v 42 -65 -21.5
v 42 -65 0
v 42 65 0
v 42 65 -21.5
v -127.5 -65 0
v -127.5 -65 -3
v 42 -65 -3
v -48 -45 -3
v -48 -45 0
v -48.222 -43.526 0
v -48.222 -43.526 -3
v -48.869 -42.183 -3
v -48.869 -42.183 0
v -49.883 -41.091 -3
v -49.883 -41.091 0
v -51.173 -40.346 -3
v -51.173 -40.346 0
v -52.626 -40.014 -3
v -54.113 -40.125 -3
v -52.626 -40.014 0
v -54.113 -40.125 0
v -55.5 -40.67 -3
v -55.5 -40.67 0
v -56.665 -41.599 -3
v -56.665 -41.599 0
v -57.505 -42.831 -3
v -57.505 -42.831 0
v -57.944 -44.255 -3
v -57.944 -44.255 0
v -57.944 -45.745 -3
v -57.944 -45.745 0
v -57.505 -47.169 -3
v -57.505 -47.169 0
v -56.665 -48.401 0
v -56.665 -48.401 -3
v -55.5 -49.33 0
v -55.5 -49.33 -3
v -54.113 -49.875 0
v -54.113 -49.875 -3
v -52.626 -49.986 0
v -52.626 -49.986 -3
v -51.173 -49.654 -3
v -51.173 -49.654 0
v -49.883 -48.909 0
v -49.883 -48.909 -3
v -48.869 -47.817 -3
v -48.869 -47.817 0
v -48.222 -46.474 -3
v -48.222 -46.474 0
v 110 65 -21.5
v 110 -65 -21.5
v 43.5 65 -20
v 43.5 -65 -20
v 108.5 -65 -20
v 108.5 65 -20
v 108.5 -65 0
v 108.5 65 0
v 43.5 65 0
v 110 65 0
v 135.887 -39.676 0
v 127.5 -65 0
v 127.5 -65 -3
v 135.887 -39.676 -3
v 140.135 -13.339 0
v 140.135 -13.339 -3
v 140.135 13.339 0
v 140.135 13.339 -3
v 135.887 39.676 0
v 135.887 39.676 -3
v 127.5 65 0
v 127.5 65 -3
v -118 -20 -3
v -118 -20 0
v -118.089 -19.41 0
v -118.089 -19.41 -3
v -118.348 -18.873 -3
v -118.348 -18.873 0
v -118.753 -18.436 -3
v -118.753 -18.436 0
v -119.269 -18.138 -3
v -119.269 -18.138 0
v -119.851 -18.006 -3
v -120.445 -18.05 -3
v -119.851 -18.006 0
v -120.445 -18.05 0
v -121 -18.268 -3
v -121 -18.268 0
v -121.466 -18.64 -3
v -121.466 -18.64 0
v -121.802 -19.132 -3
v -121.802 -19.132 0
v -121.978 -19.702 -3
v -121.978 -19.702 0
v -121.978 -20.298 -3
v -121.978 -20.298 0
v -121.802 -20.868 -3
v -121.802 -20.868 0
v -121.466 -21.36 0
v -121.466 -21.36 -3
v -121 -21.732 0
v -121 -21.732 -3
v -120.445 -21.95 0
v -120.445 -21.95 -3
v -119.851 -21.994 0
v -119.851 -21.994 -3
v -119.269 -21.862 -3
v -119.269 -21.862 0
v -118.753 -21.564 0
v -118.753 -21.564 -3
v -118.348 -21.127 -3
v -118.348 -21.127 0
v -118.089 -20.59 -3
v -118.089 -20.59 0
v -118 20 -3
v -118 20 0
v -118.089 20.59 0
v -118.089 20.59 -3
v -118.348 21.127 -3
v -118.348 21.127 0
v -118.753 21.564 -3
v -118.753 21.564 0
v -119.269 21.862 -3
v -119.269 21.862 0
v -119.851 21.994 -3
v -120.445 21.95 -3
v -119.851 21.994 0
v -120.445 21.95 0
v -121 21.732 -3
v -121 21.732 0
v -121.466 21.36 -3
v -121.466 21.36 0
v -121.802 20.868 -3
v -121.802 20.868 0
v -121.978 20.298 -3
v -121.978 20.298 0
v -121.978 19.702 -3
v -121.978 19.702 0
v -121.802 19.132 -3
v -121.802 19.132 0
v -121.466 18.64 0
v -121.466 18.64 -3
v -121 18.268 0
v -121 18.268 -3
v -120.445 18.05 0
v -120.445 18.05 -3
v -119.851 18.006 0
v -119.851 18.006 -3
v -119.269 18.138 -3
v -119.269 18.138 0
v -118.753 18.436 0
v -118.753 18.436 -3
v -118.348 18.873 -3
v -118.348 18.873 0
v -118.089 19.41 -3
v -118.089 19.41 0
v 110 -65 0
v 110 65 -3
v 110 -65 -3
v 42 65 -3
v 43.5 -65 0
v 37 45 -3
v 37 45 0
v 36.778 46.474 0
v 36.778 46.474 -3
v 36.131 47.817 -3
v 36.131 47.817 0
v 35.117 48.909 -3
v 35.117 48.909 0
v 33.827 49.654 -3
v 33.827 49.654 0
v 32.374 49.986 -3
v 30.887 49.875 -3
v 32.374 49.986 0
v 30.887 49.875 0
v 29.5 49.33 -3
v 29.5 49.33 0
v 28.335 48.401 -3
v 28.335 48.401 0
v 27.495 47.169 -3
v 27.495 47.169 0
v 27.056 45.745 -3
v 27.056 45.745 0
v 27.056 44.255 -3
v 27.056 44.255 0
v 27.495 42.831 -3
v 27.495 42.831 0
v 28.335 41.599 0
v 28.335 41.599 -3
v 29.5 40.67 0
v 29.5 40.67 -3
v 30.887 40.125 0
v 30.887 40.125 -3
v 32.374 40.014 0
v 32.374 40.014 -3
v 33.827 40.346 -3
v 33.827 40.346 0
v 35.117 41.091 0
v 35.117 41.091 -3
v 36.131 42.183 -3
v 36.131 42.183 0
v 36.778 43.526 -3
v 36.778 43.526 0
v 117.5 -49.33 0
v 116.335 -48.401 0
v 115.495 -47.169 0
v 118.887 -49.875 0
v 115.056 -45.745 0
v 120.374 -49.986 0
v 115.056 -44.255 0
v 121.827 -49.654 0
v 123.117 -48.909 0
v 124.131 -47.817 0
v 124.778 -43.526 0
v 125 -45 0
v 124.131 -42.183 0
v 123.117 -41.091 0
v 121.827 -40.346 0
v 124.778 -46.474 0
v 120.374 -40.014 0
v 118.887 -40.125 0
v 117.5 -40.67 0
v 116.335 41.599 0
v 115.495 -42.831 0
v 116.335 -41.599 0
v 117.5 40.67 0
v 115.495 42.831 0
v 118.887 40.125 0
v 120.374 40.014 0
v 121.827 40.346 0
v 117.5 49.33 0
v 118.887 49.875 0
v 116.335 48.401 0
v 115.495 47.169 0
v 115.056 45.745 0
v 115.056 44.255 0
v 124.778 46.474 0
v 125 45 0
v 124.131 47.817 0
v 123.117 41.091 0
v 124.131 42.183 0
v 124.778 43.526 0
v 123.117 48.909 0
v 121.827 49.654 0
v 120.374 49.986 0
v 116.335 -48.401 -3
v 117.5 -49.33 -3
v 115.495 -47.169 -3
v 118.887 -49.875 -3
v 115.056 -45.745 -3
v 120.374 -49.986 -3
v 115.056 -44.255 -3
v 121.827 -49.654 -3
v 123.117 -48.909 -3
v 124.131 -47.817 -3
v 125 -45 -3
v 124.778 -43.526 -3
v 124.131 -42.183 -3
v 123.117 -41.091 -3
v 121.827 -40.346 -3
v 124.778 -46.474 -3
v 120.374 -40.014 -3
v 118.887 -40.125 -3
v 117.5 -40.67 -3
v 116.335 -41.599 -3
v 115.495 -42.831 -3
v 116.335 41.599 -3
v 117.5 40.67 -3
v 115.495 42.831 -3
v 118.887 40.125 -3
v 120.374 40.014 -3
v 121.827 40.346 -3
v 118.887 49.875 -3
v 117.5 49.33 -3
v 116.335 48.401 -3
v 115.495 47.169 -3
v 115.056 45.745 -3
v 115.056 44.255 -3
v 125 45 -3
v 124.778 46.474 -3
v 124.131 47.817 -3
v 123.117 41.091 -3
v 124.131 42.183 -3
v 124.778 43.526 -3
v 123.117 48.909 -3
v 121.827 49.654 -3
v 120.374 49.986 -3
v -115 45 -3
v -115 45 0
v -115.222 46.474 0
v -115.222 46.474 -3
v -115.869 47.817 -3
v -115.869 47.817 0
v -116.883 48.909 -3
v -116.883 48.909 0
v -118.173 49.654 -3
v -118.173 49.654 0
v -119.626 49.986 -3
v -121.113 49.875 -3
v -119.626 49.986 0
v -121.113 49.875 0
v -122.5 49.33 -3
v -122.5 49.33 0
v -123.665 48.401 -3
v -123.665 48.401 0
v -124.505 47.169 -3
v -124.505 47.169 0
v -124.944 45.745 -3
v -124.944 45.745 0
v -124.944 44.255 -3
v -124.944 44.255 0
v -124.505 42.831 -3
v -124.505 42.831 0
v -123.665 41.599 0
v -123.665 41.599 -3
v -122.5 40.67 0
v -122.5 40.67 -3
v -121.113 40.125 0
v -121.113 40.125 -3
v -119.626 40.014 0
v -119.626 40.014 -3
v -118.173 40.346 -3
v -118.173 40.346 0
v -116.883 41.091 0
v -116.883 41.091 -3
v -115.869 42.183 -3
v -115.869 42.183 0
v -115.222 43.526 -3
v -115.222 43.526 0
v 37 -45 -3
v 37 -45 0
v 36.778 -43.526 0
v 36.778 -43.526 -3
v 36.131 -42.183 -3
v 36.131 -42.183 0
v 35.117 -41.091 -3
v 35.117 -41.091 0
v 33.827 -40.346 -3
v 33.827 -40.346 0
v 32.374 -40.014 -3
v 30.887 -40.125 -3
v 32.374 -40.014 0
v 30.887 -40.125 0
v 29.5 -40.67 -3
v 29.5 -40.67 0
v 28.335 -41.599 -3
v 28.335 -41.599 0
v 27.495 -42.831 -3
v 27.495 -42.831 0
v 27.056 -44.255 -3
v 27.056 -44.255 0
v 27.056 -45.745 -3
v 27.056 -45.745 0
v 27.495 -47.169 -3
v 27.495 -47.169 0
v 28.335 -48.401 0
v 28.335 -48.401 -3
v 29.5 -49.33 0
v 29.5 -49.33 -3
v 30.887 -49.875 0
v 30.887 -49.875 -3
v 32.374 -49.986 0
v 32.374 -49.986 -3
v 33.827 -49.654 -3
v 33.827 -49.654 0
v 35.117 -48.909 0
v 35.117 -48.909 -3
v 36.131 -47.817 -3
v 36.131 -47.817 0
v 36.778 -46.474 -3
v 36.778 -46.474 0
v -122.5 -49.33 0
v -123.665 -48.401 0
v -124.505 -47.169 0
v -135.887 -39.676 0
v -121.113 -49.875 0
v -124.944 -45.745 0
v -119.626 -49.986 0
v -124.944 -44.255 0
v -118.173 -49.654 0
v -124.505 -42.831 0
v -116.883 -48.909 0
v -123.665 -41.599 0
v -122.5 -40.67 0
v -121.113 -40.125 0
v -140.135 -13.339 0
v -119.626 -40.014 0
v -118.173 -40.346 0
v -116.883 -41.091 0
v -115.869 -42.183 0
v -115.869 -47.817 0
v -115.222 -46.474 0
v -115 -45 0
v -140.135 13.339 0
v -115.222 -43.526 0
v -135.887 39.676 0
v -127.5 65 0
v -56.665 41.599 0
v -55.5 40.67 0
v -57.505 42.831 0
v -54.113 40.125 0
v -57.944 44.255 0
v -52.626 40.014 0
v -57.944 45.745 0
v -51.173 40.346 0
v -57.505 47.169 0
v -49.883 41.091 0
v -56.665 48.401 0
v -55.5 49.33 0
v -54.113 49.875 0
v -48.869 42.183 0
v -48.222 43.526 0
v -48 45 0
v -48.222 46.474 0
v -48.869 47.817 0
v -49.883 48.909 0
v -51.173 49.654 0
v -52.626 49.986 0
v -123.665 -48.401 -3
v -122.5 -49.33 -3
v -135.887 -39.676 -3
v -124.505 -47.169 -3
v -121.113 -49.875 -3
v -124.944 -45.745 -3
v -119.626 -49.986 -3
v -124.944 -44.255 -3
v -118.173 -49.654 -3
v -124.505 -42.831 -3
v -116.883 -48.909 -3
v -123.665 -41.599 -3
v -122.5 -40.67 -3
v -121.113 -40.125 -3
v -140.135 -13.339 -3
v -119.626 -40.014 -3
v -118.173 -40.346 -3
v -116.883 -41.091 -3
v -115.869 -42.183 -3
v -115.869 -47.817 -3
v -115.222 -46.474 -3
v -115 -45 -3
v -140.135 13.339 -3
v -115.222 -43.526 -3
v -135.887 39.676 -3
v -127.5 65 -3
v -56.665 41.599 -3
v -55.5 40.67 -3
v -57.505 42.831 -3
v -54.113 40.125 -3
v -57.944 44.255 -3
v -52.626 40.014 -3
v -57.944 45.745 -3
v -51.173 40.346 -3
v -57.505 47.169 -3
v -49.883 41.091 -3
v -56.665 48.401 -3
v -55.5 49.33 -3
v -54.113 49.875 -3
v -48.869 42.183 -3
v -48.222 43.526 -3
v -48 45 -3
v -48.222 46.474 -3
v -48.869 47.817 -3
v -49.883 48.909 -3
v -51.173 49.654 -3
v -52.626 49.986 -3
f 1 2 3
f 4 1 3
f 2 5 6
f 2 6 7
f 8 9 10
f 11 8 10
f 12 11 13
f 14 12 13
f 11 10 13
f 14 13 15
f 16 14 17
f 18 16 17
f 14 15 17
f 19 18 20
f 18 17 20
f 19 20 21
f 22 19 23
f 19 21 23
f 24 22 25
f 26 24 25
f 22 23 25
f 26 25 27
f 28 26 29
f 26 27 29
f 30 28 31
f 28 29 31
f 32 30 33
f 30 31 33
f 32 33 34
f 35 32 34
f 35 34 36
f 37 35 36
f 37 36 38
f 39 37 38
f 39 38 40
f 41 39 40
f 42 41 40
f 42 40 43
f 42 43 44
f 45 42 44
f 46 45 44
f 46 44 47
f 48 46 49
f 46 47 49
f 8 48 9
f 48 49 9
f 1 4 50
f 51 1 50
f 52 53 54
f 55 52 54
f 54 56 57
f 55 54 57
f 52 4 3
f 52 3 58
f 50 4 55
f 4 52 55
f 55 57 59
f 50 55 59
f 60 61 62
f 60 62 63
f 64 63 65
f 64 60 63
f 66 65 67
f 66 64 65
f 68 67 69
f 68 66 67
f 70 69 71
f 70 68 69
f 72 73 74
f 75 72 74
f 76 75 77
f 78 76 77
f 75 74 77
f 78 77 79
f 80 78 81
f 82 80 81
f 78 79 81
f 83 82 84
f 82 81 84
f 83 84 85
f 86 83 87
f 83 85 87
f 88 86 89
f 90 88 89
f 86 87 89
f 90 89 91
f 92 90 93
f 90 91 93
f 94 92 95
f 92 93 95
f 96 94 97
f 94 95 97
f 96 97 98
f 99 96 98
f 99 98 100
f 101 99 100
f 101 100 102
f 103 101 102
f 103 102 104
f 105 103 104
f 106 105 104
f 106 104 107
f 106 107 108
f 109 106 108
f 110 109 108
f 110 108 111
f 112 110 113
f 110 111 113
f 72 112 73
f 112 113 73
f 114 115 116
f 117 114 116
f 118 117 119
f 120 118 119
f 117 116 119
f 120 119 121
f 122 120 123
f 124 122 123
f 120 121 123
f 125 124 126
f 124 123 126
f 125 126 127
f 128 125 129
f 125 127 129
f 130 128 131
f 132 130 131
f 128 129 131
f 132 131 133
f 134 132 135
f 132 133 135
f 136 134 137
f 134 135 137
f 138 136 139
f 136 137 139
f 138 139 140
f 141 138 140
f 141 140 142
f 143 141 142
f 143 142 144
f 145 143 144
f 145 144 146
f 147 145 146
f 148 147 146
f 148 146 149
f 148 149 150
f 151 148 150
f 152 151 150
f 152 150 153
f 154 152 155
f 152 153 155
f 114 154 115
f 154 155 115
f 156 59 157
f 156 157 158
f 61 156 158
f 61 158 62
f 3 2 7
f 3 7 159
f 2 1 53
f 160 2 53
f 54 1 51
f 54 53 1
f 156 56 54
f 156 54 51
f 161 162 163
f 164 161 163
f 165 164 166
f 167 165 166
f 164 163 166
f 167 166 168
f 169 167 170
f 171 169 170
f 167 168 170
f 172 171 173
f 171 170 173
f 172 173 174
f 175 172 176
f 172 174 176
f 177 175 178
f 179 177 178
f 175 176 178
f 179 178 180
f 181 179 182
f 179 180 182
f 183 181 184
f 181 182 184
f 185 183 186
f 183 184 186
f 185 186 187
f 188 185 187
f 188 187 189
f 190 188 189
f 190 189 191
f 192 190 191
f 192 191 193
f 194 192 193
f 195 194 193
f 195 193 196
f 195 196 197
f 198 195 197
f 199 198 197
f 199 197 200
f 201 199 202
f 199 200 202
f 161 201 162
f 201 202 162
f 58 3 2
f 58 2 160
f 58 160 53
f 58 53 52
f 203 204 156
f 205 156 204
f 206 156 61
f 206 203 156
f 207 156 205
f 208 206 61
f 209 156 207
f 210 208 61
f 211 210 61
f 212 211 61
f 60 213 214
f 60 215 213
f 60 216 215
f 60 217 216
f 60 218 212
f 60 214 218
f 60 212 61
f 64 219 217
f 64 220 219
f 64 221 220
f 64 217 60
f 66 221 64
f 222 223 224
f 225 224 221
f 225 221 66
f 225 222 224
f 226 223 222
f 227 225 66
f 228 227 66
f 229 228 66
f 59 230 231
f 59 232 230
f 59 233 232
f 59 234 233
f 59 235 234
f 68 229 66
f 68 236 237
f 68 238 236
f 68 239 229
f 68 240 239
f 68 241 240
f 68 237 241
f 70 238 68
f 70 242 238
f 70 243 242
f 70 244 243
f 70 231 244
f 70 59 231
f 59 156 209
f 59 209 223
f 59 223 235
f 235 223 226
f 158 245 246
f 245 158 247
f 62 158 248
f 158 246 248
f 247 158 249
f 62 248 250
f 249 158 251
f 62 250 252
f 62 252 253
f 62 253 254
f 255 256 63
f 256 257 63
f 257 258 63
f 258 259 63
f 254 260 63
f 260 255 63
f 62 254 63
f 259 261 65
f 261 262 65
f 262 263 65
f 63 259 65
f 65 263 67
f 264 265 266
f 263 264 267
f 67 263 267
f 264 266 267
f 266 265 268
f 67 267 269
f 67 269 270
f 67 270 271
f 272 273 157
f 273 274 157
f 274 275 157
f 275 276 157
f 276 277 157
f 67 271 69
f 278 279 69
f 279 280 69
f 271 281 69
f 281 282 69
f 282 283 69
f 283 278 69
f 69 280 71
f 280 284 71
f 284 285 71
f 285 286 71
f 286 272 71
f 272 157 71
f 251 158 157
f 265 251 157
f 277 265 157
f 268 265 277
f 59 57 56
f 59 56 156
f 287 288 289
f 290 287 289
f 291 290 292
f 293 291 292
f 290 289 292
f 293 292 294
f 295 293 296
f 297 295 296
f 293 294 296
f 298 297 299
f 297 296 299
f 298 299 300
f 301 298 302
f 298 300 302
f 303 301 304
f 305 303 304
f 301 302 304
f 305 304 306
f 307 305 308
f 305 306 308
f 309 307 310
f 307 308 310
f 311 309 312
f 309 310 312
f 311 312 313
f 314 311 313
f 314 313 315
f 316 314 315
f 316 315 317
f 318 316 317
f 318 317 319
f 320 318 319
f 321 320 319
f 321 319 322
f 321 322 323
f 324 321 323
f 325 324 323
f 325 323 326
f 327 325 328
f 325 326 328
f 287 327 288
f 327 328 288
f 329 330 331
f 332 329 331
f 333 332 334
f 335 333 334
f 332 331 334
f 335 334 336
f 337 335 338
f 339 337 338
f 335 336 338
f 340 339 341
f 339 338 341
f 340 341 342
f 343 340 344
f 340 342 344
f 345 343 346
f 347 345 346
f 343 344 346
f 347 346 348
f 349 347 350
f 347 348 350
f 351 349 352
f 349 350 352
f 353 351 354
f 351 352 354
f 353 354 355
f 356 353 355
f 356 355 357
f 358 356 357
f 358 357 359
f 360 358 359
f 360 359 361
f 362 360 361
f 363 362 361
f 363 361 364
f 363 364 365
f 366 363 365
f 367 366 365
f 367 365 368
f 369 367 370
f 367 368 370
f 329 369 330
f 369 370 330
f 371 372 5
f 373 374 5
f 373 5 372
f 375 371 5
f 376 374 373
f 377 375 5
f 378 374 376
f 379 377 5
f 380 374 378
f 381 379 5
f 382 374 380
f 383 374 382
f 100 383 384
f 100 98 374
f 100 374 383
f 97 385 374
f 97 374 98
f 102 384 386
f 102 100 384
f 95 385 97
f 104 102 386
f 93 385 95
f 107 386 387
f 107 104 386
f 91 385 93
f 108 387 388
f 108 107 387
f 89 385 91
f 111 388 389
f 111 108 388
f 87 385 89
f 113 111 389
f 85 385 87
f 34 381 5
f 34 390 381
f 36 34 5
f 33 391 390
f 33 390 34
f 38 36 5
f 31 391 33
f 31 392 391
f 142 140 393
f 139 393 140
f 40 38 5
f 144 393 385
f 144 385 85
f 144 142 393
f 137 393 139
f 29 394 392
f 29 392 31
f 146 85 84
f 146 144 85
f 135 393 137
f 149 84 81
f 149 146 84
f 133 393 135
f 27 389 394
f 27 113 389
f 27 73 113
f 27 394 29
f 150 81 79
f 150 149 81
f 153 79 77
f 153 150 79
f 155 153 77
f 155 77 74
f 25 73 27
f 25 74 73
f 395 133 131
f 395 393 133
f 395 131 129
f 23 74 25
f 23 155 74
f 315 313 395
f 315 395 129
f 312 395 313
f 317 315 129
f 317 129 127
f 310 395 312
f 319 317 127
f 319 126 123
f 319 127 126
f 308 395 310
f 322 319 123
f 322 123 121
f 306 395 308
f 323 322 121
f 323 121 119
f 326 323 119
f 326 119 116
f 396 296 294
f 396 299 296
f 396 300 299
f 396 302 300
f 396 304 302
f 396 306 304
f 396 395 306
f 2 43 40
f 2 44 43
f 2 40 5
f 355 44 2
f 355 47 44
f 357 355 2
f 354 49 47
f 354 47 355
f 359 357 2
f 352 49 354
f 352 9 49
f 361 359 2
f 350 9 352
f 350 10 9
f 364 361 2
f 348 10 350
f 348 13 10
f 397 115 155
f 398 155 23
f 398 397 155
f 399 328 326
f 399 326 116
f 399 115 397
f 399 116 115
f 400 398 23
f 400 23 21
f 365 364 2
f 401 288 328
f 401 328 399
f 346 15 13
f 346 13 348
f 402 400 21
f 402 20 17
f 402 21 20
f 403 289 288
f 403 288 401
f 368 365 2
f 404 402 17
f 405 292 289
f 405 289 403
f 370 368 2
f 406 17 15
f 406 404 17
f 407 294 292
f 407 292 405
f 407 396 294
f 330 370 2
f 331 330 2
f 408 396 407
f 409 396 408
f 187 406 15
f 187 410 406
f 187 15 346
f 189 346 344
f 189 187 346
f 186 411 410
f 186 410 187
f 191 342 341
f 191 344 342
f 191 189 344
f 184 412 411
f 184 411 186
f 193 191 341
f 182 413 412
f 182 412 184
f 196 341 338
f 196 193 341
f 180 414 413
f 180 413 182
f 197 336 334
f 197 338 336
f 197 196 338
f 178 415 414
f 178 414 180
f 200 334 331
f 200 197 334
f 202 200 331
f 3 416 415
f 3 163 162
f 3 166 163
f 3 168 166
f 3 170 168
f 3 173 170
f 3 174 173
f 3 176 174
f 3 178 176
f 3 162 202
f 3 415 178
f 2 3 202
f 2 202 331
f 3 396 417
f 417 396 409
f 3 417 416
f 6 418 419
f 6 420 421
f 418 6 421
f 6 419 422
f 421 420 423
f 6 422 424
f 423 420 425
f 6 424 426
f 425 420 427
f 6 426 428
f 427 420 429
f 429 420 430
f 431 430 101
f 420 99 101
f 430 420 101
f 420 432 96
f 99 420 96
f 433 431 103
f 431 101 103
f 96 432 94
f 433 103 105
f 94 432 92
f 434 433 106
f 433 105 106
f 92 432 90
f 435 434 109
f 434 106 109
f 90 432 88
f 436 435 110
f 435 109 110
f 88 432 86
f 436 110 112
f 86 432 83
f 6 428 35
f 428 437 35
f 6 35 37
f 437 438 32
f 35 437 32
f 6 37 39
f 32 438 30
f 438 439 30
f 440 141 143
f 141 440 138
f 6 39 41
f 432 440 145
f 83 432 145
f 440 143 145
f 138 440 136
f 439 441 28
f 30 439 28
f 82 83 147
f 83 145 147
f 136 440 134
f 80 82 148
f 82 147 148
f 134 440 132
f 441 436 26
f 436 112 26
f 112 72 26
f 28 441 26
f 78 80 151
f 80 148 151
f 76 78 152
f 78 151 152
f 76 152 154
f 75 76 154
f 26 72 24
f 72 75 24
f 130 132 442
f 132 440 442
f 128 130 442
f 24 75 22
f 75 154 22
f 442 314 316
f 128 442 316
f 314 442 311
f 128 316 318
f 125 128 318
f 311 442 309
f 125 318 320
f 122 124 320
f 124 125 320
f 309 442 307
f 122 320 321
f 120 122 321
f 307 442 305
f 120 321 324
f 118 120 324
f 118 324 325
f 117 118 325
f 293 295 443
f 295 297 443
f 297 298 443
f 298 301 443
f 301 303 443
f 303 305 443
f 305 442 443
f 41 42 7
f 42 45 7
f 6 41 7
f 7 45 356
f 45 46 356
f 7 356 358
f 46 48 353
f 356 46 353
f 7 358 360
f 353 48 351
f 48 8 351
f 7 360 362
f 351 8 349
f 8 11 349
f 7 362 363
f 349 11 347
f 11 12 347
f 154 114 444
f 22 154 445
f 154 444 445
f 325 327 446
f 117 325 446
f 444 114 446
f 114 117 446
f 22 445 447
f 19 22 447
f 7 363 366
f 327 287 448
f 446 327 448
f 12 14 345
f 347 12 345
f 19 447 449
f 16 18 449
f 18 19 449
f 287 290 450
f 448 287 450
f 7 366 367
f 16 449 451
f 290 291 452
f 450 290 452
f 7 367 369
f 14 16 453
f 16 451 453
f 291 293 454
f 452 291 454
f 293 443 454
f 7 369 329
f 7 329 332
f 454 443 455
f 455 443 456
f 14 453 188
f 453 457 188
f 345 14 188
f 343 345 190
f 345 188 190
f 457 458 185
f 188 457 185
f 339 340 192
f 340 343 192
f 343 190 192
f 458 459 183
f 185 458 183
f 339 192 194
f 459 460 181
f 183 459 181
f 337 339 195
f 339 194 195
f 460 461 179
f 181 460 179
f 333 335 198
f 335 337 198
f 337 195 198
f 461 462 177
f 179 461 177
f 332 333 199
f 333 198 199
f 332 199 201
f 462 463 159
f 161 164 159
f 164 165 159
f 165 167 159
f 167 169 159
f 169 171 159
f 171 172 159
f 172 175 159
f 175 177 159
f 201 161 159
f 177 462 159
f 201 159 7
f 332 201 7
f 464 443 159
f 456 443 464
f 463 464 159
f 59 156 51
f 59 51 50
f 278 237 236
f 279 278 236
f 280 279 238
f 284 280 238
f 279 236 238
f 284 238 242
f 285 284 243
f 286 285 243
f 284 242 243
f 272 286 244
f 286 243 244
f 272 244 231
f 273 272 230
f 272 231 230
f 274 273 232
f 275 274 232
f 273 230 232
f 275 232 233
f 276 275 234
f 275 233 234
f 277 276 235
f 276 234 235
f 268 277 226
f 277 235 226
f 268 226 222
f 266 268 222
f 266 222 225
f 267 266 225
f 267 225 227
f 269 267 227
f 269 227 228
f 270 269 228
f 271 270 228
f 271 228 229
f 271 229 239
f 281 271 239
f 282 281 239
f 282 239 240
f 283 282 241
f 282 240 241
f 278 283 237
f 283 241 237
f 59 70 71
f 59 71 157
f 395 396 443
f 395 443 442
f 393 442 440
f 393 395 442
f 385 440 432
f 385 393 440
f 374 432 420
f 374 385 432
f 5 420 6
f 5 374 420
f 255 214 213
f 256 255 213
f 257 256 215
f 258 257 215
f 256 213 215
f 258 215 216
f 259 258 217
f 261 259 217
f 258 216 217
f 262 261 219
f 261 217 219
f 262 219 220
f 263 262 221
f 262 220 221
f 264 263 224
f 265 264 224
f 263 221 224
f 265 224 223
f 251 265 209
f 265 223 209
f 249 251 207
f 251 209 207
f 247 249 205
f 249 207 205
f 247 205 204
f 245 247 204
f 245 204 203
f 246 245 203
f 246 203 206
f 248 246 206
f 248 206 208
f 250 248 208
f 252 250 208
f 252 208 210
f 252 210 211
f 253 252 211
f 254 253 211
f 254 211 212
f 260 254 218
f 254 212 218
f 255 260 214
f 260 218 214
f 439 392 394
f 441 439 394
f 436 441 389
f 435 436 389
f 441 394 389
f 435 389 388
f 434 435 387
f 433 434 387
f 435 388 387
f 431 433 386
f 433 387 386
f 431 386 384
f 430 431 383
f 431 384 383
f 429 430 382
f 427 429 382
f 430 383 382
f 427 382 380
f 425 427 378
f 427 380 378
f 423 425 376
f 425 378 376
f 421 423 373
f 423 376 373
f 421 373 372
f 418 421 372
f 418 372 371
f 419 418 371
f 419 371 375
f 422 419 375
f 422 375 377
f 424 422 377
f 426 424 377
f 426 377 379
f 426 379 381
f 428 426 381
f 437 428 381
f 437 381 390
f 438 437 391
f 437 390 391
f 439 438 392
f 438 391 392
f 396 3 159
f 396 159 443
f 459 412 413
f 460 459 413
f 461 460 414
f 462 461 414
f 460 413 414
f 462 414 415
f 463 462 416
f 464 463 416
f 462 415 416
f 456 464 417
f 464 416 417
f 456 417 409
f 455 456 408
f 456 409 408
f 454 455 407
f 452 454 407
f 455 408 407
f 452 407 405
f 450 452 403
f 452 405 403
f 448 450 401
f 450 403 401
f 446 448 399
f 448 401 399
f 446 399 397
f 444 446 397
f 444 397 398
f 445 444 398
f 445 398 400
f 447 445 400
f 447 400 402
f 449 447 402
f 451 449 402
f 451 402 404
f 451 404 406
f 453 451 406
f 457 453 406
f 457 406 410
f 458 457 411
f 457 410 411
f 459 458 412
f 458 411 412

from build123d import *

# Parameters (mm, degrees)
F0_R     = 5
F0_R_2   = 2
F1_DEPTH = 3
F0_W     = 68
F0_H     = 130
F2_DEPTH = 21.5
F3_T     = -1.5


with BuildPart() as f1:
    # F0 (on Top) → F1 (new body)
    with BuildSketch(Plane.XY):
        with BuildLine():
            Line((-127.5, -65), (42, -65))
            Line((42, -65), (42, 65))
            Line((42, 65), (-127.5, 65))
            ThreePointArc((-127.5, 65), (-140.668924, 0), (-127.5, -65))
        make_face()
        with Locations((-120, -45)):
            Circle(F0_R, mode=Mode.SUBTRACT)
        with Locations((-53, -45)):
            Circle(F0_R, mode=Mode.SUBTRACT)
        with Locations((-120, -20)):
            Circle(F0_R_2, mode=Mode.SUBTRACT)
        with Locations((32, -45)):
            Circle(F0_R, mode=Mode.SUBTRACT)
        with Locations((-120, 20)):
            Circle(F0_R_2, mode=Mode.SUBTRACT)
        with Locations((-120, 45)):
            Circle(F0_R, mode=Mode.SUBTRACT)
        with Locations((-53, 45)):
            Circle(F0_R, mode=Mode.SUBTRACT)
        with Locations((32, 45)):
            Circle(F0_R, mode=Mode.SUBTRACT)
        with BuildLine():
            Line((110, -65), (127.5, -65))
            ThreePointArc((127.5, -65), (140.668924, 0), (127.5, 65))
            Line((127.5, 65), (110, 65))
            Line((110, 65), (110, -65))
        make_face()
        with Locations((120, -45)):
            Circle(F0_R, mode=Mode.SUBTRACT)
        with Locations((120, 45)):
            Circle(F0_R, mode=Mode.SUBTRACT)
    extrude(amount=-F1_DEPTH)


with BuildPart() as f2:
    # F0 (on Top) → F2 (new body)
    with BuildSketch(Plane.XY):
        with Locations((76, 0)):
            Rectangle(F0_W, F0_H)
    extrude(amount=-F2_DEPTH)

    # F3
    f3_openings = [f2.faces().sort_by_distance(p)[0] for p in [
        (76, -65, -10.75),
        (76, 65, -10.75),
        (76, 0, 0),
    ]]
    offset(amount=F3_T, openings=f3_openings)


solid = Compound([f1.part, f2.part])
